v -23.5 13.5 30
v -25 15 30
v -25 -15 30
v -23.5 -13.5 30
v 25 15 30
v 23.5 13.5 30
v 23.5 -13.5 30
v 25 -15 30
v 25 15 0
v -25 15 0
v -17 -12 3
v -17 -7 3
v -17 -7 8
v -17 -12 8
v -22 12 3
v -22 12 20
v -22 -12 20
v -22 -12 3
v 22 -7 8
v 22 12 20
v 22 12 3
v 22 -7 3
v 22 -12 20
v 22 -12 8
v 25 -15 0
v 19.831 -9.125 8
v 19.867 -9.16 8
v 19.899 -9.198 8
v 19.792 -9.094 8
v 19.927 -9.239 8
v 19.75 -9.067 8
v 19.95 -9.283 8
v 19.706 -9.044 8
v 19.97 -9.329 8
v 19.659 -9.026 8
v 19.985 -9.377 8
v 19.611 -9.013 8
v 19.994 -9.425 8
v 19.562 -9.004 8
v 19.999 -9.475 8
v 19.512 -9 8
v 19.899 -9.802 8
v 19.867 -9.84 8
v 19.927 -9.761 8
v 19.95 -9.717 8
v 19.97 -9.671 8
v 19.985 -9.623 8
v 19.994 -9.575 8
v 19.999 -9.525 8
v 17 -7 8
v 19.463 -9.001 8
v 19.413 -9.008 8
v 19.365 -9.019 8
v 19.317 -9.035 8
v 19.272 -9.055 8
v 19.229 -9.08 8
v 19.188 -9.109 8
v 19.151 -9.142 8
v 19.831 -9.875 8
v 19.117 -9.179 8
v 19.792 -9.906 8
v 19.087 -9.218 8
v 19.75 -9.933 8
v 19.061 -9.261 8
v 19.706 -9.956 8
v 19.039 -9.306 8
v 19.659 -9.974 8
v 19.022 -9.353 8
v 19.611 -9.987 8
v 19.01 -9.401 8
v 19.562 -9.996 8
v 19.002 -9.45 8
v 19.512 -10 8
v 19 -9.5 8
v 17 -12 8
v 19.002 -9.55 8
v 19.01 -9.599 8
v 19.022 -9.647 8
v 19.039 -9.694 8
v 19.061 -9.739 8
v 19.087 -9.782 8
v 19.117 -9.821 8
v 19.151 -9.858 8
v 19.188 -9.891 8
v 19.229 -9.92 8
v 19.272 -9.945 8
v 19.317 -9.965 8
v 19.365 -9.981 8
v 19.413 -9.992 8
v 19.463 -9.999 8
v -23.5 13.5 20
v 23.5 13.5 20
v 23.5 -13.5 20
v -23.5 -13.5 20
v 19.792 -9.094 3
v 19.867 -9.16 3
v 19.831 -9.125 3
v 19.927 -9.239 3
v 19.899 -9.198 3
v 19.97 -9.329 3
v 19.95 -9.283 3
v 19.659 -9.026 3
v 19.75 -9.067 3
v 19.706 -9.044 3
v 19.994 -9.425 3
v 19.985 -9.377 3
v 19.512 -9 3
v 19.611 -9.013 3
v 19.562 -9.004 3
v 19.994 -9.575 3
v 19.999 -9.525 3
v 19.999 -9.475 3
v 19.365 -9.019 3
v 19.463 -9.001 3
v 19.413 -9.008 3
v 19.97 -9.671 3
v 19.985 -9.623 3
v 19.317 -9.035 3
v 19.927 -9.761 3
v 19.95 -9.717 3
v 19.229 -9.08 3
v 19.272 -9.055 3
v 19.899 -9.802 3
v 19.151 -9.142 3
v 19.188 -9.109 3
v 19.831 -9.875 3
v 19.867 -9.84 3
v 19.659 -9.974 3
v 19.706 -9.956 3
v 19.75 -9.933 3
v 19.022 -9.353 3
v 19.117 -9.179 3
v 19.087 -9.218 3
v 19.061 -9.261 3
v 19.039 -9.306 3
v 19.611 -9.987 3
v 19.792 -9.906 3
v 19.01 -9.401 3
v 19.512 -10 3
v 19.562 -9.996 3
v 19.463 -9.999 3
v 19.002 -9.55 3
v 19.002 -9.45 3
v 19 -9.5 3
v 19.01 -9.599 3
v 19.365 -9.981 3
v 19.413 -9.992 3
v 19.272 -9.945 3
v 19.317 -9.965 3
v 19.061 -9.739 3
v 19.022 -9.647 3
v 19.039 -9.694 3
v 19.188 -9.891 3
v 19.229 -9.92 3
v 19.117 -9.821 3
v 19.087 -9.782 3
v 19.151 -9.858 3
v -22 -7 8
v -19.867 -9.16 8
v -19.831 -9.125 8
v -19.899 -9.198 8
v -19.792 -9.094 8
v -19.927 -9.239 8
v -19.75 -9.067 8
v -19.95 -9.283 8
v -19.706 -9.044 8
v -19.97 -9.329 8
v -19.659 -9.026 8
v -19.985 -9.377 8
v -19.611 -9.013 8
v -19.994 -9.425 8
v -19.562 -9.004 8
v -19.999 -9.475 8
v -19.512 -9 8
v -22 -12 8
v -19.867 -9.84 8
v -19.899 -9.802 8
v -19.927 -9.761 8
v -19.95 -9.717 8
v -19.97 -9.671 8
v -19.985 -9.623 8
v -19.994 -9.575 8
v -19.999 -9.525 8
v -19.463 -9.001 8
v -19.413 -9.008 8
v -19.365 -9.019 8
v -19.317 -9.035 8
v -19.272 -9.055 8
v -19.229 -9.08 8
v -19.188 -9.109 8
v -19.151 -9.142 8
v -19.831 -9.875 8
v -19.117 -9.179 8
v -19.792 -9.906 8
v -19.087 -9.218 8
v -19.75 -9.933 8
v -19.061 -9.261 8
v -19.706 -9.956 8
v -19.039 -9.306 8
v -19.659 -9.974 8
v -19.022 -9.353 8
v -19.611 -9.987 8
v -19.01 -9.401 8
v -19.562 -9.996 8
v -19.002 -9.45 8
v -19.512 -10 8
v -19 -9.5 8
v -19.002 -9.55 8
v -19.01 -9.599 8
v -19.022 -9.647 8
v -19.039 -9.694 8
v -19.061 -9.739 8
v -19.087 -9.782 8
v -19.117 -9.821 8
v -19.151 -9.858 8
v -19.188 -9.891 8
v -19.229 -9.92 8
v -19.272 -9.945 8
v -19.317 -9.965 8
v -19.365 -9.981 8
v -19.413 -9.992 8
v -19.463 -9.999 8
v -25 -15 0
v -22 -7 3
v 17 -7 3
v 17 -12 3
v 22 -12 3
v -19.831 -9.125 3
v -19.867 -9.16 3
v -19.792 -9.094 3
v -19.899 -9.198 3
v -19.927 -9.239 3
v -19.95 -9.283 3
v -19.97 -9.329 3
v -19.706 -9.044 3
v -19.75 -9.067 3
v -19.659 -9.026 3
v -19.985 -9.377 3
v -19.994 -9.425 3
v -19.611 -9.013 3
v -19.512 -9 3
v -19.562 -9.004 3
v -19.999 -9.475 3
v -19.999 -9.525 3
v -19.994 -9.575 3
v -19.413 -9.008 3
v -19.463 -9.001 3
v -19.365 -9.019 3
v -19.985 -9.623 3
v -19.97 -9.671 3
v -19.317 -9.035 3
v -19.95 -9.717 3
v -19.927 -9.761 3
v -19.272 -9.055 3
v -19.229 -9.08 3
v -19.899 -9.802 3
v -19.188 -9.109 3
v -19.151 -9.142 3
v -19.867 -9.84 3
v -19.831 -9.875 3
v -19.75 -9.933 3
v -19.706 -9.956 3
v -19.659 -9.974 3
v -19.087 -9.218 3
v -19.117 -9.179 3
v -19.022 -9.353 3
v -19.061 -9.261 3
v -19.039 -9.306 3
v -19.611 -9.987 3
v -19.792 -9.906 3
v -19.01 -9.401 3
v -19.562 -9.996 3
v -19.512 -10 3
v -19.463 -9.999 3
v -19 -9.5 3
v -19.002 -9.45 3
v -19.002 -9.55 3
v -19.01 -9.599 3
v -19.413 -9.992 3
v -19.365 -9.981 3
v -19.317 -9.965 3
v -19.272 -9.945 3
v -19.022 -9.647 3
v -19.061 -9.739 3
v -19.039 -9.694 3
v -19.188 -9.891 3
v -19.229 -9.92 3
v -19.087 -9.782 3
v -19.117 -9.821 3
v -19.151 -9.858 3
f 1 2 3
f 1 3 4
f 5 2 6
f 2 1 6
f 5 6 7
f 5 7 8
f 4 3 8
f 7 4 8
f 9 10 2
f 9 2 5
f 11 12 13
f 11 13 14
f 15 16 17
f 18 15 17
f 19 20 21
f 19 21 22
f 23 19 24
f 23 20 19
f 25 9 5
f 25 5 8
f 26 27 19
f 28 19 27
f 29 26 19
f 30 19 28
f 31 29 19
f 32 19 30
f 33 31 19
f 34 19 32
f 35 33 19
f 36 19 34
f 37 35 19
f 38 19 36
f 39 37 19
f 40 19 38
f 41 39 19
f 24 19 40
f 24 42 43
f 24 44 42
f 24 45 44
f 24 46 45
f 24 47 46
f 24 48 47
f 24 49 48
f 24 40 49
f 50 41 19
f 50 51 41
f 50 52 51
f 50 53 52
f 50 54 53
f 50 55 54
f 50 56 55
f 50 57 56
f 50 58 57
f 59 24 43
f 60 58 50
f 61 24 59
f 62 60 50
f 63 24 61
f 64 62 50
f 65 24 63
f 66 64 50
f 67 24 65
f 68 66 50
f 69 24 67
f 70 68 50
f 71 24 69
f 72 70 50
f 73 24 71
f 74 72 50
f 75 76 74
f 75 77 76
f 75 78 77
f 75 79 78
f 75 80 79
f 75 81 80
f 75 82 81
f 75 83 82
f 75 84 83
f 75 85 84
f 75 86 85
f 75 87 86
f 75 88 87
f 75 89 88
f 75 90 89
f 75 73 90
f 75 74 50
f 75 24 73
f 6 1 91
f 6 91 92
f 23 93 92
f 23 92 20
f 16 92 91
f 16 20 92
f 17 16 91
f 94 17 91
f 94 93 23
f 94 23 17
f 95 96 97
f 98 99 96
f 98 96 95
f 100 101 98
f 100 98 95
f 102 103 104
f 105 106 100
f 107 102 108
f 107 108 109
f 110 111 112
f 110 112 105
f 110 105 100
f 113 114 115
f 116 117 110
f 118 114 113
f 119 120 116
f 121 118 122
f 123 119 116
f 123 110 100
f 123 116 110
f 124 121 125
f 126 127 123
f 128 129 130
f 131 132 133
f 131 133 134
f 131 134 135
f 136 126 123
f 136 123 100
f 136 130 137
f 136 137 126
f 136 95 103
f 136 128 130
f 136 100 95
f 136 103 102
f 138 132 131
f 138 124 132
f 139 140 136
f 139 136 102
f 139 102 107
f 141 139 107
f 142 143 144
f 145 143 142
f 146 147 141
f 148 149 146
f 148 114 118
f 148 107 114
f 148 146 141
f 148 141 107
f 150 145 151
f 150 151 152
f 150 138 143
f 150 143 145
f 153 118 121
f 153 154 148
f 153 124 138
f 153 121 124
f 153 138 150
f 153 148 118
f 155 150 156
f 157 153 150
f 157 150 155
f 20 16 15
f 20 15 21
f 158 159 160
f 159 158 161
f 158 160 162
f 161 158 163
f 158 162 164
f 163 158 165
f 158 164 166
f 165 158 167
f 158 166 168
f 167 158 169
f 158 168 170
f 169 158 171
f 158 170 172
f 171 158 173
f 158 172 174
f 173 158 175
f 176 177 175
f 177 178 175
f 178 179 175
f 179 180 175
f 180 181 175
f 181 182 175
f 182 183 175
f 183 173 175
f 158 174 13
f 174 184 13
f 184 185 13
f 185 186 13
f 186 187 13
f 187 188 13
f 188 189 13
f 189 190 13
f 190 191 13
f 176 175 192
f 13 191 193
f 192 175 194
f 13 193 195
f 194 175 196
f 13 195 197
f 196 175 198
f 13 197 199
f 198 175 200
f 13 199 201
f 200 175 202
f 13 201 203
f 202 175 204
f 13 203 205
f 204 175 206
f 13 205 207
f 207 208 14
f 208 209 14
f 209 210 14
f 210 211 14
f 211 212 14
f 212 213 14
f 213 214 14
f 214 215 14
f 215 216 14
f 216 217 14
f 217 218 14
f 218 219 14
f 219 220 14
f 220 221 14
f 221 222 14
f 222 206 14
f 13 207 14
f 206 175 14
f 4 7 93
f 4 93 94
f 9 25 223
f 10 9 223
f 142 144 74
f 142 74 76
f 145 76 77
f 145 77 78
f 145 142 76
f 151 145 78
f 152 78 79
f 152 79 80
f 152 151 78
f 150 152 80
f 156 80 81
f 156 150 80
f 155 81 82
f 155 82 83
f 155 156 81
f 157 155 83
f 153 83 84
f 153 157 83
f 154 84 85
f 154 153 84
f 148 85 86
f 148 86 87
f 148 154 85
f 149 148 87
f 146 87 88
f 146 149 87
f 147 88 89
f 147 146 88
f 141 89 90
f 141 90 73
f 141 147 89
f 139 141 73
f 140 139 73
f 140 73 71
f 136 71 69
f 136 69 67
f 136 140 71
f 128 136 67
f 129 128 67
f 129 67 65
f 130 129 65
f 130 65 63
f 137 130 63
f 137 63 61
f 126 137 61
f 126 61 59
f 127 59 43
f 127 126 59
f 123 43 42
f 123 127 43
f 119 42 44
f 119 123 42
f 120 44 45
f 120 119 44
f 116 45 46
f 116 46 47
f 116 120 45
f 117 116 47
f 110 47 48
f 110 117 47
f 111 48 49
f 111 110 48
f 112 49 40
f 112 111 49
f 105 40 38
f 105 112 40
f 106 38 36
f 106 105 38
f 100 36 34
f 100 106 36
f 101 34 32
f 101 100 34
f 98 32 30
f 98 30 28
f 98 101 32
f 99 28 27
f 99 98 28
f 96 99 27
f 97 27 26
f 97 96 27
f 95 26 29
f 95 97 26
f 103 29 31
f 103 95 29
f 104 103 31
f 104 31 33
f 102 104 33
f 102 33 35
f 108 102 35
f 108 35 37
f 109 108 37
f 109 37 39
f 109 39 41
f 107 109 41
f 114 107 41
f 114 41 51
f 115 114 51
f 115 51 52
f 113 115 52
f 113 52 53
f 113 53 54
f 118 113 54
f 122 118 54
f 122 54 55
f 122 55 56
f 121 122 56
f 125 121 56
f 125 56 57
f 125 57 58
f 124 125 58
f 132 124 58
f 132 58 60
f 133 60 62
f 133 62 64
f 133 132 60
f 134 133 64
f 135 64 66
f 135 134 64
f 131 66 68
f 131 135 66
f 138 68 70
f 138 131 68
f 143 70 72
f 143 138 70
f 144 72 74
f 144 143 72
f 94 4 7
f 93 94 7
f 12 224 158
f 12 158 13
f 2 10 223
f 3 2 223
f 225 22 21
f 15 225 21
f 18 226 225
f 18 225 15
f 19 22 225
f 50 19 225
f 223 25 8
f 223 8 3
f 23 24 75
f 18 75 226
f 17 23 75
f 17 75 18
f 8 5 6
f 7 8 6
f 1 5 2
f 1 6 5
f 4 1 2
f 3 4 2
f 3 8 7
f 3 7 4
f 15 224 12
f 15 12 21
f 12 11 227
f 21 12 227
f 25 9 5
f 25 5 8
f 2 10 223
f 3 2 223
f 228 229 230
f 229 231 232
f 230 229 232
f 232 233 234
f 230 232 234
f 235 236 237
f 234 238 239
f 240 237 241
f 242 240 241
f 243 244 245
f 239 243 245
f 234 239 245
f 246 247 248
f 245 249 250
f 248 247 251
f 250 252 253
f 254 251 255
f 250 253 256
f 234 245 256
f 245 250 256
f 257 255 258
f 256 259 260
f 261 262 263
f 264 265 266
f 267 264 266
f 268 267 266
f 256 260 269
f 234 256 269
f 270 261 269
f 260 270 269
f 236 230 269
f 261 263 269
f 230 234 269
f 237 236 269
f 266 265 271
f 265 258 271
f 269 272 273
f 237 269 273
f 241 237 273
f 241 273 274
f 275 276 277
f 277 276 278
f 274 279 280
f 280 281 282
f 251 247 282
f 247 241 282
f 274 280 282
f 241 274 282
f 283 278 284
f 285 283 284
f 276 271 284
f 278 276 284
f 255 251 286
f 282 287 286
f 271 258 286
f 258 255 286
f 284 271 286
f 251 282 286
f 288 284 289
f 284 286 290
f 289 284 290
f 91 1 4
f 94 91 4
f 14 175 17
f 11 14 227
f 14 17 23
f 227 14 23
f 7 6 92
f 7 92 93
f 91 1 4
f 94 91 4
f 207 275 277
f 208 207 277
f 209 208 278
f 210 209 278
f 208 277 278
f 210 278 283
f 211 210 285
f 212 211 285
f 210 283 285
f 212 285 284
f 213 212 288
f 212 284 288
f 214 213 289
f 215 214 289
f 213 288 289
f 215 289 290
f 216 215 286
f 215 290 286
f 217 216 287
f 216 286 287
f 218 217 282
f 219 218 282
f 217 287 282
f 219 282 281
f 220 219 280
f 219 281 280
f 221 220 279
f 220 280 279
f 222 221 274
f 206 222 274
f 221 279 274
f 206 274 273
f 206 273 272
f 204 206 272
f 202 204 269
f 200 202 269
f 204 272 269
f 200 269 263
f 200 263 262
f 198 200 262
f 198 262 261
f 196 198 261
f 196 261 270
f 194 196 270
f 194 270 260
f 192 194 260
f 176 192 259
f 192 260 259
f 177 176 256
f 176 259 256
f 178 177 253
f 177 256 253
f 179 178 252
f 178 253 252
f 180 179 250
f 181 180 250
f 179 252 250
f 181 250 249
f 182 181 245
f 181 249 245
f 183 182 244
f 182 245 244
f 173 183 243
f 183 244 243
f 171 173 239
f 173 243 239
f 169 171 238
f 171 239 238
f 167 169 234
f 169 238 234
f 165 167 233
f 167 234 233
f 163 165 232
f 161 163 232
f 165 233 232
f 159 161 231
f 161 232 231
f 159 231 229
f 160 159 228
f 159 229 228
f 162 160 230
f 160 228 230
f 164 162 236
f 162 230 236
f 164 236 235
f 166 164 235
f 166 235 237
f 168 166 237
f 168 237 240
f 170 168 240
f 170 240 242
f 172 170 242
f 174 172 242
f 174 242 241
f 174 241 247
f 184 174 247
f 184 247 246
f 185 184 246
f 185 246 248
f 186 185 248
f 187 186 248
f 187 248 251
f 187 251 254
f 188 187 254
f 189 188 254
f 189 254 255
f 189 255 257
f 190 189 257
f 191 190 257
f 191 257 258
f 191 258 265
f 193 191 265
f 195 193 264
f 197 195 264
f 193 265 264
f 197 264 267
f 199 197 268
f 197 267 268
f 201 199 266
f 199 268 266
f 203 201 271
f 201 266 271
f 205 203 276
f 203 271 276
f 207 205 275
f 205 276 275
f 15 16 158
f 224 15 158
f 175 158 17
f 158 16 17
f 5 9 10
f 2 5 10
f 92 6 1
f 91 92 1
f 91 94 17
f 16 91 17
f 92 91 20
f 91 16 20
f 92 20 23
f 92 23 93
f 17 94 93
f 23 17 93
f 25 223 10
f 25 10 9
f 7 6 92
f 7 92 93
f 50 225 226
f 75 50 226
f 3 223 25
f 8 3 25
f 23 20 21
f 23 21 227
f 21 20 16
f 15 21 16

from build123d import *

# Parameters (mm, degrees)
SKETCH_W        = 50
SKETCH_H        = 30
PAD_DEPTH       = 30
SKETCH002_W     = 44
SKETCH002_H     = 24
POCKET_DEPTH    = 27
SKETCH003_W     = 47
SKETCH003_H     = 27
POCKET001_DEPTH = 10
SKETCH005_W     = 5
SKETCH005_H     = 5
SKETCH005_R     = 0.5
PAD001_DEPTH    = 5


with BuildPart() as pad001body:
    # Sketch → Pad (new body)
    with BuildSketch(Plane.XY):
        Rectangle(SKETCH_W, SKETCH_H)
    extrude(amount=PAD_DEPTH)

    # Sketch002 (on Face6 of Pad) → Pocket (cut)
    with BuildSketch(Plane.XY.offset(30)):
        Rectangle(SKETCH002_W, SKETCH002_H)
    extrude(amount=-POCKET_DEPTH, mode=Mode.SUBTRACT)

    # Sketch003 (on Face5 of Pocket) → Pocket001 (cut)
    with BuildSketch(Plane.XY.offset(30)):
        Rectangle(SKETCH003_W, SKETCH003_H)
    extrude(amount=-POCKET001_DEPTH, mode=Mode.SUBTRACT)

    # Sketch005 (on Face16 of Pocket001) → Pad001 (new body)
    with BuildSketch(Plane.XY.offset(3)):
        with Locations((-19.5, 9.5)):
            Rectangle(SKETCH005_W, SKETCH005_H)
        with Locations((-19.5, 9.5)):
            Circle(SKETCH005_R, mode=Mode.SUBTRACT)
    extrude(amount=PAD001_DEPTH)


with BuildPart() as part_mirroring:
    # Part__Mirroring: instance of Pad001Body
    add(pad001body.part.mirror(Plane(origin=(0, 0, 0), x_dir=(0, -1, 0), z_dir=(1, 0, 0))))


with BuildPart() as part_mirroring001:
    # Part__Mirroring001: instance of Part__Mirroring
    add(part_mirroring.part.mirror(Plane(origin=(0, 0, 0), x_dir=(1, 0, 0), z_dir=(0, 1, 0))))


with BuildPart() as part_mirroring002:
    # Part__Mirroring002: instance of Pad001Body
    add(pad001body.part.mirror(Plane(origin=(0, 0, 0), x_dir=(1, 0, 0), z_dir=(0, 1, 0))))


solid = Compound([part_mirroring001.part, part_mirroring002.part])
